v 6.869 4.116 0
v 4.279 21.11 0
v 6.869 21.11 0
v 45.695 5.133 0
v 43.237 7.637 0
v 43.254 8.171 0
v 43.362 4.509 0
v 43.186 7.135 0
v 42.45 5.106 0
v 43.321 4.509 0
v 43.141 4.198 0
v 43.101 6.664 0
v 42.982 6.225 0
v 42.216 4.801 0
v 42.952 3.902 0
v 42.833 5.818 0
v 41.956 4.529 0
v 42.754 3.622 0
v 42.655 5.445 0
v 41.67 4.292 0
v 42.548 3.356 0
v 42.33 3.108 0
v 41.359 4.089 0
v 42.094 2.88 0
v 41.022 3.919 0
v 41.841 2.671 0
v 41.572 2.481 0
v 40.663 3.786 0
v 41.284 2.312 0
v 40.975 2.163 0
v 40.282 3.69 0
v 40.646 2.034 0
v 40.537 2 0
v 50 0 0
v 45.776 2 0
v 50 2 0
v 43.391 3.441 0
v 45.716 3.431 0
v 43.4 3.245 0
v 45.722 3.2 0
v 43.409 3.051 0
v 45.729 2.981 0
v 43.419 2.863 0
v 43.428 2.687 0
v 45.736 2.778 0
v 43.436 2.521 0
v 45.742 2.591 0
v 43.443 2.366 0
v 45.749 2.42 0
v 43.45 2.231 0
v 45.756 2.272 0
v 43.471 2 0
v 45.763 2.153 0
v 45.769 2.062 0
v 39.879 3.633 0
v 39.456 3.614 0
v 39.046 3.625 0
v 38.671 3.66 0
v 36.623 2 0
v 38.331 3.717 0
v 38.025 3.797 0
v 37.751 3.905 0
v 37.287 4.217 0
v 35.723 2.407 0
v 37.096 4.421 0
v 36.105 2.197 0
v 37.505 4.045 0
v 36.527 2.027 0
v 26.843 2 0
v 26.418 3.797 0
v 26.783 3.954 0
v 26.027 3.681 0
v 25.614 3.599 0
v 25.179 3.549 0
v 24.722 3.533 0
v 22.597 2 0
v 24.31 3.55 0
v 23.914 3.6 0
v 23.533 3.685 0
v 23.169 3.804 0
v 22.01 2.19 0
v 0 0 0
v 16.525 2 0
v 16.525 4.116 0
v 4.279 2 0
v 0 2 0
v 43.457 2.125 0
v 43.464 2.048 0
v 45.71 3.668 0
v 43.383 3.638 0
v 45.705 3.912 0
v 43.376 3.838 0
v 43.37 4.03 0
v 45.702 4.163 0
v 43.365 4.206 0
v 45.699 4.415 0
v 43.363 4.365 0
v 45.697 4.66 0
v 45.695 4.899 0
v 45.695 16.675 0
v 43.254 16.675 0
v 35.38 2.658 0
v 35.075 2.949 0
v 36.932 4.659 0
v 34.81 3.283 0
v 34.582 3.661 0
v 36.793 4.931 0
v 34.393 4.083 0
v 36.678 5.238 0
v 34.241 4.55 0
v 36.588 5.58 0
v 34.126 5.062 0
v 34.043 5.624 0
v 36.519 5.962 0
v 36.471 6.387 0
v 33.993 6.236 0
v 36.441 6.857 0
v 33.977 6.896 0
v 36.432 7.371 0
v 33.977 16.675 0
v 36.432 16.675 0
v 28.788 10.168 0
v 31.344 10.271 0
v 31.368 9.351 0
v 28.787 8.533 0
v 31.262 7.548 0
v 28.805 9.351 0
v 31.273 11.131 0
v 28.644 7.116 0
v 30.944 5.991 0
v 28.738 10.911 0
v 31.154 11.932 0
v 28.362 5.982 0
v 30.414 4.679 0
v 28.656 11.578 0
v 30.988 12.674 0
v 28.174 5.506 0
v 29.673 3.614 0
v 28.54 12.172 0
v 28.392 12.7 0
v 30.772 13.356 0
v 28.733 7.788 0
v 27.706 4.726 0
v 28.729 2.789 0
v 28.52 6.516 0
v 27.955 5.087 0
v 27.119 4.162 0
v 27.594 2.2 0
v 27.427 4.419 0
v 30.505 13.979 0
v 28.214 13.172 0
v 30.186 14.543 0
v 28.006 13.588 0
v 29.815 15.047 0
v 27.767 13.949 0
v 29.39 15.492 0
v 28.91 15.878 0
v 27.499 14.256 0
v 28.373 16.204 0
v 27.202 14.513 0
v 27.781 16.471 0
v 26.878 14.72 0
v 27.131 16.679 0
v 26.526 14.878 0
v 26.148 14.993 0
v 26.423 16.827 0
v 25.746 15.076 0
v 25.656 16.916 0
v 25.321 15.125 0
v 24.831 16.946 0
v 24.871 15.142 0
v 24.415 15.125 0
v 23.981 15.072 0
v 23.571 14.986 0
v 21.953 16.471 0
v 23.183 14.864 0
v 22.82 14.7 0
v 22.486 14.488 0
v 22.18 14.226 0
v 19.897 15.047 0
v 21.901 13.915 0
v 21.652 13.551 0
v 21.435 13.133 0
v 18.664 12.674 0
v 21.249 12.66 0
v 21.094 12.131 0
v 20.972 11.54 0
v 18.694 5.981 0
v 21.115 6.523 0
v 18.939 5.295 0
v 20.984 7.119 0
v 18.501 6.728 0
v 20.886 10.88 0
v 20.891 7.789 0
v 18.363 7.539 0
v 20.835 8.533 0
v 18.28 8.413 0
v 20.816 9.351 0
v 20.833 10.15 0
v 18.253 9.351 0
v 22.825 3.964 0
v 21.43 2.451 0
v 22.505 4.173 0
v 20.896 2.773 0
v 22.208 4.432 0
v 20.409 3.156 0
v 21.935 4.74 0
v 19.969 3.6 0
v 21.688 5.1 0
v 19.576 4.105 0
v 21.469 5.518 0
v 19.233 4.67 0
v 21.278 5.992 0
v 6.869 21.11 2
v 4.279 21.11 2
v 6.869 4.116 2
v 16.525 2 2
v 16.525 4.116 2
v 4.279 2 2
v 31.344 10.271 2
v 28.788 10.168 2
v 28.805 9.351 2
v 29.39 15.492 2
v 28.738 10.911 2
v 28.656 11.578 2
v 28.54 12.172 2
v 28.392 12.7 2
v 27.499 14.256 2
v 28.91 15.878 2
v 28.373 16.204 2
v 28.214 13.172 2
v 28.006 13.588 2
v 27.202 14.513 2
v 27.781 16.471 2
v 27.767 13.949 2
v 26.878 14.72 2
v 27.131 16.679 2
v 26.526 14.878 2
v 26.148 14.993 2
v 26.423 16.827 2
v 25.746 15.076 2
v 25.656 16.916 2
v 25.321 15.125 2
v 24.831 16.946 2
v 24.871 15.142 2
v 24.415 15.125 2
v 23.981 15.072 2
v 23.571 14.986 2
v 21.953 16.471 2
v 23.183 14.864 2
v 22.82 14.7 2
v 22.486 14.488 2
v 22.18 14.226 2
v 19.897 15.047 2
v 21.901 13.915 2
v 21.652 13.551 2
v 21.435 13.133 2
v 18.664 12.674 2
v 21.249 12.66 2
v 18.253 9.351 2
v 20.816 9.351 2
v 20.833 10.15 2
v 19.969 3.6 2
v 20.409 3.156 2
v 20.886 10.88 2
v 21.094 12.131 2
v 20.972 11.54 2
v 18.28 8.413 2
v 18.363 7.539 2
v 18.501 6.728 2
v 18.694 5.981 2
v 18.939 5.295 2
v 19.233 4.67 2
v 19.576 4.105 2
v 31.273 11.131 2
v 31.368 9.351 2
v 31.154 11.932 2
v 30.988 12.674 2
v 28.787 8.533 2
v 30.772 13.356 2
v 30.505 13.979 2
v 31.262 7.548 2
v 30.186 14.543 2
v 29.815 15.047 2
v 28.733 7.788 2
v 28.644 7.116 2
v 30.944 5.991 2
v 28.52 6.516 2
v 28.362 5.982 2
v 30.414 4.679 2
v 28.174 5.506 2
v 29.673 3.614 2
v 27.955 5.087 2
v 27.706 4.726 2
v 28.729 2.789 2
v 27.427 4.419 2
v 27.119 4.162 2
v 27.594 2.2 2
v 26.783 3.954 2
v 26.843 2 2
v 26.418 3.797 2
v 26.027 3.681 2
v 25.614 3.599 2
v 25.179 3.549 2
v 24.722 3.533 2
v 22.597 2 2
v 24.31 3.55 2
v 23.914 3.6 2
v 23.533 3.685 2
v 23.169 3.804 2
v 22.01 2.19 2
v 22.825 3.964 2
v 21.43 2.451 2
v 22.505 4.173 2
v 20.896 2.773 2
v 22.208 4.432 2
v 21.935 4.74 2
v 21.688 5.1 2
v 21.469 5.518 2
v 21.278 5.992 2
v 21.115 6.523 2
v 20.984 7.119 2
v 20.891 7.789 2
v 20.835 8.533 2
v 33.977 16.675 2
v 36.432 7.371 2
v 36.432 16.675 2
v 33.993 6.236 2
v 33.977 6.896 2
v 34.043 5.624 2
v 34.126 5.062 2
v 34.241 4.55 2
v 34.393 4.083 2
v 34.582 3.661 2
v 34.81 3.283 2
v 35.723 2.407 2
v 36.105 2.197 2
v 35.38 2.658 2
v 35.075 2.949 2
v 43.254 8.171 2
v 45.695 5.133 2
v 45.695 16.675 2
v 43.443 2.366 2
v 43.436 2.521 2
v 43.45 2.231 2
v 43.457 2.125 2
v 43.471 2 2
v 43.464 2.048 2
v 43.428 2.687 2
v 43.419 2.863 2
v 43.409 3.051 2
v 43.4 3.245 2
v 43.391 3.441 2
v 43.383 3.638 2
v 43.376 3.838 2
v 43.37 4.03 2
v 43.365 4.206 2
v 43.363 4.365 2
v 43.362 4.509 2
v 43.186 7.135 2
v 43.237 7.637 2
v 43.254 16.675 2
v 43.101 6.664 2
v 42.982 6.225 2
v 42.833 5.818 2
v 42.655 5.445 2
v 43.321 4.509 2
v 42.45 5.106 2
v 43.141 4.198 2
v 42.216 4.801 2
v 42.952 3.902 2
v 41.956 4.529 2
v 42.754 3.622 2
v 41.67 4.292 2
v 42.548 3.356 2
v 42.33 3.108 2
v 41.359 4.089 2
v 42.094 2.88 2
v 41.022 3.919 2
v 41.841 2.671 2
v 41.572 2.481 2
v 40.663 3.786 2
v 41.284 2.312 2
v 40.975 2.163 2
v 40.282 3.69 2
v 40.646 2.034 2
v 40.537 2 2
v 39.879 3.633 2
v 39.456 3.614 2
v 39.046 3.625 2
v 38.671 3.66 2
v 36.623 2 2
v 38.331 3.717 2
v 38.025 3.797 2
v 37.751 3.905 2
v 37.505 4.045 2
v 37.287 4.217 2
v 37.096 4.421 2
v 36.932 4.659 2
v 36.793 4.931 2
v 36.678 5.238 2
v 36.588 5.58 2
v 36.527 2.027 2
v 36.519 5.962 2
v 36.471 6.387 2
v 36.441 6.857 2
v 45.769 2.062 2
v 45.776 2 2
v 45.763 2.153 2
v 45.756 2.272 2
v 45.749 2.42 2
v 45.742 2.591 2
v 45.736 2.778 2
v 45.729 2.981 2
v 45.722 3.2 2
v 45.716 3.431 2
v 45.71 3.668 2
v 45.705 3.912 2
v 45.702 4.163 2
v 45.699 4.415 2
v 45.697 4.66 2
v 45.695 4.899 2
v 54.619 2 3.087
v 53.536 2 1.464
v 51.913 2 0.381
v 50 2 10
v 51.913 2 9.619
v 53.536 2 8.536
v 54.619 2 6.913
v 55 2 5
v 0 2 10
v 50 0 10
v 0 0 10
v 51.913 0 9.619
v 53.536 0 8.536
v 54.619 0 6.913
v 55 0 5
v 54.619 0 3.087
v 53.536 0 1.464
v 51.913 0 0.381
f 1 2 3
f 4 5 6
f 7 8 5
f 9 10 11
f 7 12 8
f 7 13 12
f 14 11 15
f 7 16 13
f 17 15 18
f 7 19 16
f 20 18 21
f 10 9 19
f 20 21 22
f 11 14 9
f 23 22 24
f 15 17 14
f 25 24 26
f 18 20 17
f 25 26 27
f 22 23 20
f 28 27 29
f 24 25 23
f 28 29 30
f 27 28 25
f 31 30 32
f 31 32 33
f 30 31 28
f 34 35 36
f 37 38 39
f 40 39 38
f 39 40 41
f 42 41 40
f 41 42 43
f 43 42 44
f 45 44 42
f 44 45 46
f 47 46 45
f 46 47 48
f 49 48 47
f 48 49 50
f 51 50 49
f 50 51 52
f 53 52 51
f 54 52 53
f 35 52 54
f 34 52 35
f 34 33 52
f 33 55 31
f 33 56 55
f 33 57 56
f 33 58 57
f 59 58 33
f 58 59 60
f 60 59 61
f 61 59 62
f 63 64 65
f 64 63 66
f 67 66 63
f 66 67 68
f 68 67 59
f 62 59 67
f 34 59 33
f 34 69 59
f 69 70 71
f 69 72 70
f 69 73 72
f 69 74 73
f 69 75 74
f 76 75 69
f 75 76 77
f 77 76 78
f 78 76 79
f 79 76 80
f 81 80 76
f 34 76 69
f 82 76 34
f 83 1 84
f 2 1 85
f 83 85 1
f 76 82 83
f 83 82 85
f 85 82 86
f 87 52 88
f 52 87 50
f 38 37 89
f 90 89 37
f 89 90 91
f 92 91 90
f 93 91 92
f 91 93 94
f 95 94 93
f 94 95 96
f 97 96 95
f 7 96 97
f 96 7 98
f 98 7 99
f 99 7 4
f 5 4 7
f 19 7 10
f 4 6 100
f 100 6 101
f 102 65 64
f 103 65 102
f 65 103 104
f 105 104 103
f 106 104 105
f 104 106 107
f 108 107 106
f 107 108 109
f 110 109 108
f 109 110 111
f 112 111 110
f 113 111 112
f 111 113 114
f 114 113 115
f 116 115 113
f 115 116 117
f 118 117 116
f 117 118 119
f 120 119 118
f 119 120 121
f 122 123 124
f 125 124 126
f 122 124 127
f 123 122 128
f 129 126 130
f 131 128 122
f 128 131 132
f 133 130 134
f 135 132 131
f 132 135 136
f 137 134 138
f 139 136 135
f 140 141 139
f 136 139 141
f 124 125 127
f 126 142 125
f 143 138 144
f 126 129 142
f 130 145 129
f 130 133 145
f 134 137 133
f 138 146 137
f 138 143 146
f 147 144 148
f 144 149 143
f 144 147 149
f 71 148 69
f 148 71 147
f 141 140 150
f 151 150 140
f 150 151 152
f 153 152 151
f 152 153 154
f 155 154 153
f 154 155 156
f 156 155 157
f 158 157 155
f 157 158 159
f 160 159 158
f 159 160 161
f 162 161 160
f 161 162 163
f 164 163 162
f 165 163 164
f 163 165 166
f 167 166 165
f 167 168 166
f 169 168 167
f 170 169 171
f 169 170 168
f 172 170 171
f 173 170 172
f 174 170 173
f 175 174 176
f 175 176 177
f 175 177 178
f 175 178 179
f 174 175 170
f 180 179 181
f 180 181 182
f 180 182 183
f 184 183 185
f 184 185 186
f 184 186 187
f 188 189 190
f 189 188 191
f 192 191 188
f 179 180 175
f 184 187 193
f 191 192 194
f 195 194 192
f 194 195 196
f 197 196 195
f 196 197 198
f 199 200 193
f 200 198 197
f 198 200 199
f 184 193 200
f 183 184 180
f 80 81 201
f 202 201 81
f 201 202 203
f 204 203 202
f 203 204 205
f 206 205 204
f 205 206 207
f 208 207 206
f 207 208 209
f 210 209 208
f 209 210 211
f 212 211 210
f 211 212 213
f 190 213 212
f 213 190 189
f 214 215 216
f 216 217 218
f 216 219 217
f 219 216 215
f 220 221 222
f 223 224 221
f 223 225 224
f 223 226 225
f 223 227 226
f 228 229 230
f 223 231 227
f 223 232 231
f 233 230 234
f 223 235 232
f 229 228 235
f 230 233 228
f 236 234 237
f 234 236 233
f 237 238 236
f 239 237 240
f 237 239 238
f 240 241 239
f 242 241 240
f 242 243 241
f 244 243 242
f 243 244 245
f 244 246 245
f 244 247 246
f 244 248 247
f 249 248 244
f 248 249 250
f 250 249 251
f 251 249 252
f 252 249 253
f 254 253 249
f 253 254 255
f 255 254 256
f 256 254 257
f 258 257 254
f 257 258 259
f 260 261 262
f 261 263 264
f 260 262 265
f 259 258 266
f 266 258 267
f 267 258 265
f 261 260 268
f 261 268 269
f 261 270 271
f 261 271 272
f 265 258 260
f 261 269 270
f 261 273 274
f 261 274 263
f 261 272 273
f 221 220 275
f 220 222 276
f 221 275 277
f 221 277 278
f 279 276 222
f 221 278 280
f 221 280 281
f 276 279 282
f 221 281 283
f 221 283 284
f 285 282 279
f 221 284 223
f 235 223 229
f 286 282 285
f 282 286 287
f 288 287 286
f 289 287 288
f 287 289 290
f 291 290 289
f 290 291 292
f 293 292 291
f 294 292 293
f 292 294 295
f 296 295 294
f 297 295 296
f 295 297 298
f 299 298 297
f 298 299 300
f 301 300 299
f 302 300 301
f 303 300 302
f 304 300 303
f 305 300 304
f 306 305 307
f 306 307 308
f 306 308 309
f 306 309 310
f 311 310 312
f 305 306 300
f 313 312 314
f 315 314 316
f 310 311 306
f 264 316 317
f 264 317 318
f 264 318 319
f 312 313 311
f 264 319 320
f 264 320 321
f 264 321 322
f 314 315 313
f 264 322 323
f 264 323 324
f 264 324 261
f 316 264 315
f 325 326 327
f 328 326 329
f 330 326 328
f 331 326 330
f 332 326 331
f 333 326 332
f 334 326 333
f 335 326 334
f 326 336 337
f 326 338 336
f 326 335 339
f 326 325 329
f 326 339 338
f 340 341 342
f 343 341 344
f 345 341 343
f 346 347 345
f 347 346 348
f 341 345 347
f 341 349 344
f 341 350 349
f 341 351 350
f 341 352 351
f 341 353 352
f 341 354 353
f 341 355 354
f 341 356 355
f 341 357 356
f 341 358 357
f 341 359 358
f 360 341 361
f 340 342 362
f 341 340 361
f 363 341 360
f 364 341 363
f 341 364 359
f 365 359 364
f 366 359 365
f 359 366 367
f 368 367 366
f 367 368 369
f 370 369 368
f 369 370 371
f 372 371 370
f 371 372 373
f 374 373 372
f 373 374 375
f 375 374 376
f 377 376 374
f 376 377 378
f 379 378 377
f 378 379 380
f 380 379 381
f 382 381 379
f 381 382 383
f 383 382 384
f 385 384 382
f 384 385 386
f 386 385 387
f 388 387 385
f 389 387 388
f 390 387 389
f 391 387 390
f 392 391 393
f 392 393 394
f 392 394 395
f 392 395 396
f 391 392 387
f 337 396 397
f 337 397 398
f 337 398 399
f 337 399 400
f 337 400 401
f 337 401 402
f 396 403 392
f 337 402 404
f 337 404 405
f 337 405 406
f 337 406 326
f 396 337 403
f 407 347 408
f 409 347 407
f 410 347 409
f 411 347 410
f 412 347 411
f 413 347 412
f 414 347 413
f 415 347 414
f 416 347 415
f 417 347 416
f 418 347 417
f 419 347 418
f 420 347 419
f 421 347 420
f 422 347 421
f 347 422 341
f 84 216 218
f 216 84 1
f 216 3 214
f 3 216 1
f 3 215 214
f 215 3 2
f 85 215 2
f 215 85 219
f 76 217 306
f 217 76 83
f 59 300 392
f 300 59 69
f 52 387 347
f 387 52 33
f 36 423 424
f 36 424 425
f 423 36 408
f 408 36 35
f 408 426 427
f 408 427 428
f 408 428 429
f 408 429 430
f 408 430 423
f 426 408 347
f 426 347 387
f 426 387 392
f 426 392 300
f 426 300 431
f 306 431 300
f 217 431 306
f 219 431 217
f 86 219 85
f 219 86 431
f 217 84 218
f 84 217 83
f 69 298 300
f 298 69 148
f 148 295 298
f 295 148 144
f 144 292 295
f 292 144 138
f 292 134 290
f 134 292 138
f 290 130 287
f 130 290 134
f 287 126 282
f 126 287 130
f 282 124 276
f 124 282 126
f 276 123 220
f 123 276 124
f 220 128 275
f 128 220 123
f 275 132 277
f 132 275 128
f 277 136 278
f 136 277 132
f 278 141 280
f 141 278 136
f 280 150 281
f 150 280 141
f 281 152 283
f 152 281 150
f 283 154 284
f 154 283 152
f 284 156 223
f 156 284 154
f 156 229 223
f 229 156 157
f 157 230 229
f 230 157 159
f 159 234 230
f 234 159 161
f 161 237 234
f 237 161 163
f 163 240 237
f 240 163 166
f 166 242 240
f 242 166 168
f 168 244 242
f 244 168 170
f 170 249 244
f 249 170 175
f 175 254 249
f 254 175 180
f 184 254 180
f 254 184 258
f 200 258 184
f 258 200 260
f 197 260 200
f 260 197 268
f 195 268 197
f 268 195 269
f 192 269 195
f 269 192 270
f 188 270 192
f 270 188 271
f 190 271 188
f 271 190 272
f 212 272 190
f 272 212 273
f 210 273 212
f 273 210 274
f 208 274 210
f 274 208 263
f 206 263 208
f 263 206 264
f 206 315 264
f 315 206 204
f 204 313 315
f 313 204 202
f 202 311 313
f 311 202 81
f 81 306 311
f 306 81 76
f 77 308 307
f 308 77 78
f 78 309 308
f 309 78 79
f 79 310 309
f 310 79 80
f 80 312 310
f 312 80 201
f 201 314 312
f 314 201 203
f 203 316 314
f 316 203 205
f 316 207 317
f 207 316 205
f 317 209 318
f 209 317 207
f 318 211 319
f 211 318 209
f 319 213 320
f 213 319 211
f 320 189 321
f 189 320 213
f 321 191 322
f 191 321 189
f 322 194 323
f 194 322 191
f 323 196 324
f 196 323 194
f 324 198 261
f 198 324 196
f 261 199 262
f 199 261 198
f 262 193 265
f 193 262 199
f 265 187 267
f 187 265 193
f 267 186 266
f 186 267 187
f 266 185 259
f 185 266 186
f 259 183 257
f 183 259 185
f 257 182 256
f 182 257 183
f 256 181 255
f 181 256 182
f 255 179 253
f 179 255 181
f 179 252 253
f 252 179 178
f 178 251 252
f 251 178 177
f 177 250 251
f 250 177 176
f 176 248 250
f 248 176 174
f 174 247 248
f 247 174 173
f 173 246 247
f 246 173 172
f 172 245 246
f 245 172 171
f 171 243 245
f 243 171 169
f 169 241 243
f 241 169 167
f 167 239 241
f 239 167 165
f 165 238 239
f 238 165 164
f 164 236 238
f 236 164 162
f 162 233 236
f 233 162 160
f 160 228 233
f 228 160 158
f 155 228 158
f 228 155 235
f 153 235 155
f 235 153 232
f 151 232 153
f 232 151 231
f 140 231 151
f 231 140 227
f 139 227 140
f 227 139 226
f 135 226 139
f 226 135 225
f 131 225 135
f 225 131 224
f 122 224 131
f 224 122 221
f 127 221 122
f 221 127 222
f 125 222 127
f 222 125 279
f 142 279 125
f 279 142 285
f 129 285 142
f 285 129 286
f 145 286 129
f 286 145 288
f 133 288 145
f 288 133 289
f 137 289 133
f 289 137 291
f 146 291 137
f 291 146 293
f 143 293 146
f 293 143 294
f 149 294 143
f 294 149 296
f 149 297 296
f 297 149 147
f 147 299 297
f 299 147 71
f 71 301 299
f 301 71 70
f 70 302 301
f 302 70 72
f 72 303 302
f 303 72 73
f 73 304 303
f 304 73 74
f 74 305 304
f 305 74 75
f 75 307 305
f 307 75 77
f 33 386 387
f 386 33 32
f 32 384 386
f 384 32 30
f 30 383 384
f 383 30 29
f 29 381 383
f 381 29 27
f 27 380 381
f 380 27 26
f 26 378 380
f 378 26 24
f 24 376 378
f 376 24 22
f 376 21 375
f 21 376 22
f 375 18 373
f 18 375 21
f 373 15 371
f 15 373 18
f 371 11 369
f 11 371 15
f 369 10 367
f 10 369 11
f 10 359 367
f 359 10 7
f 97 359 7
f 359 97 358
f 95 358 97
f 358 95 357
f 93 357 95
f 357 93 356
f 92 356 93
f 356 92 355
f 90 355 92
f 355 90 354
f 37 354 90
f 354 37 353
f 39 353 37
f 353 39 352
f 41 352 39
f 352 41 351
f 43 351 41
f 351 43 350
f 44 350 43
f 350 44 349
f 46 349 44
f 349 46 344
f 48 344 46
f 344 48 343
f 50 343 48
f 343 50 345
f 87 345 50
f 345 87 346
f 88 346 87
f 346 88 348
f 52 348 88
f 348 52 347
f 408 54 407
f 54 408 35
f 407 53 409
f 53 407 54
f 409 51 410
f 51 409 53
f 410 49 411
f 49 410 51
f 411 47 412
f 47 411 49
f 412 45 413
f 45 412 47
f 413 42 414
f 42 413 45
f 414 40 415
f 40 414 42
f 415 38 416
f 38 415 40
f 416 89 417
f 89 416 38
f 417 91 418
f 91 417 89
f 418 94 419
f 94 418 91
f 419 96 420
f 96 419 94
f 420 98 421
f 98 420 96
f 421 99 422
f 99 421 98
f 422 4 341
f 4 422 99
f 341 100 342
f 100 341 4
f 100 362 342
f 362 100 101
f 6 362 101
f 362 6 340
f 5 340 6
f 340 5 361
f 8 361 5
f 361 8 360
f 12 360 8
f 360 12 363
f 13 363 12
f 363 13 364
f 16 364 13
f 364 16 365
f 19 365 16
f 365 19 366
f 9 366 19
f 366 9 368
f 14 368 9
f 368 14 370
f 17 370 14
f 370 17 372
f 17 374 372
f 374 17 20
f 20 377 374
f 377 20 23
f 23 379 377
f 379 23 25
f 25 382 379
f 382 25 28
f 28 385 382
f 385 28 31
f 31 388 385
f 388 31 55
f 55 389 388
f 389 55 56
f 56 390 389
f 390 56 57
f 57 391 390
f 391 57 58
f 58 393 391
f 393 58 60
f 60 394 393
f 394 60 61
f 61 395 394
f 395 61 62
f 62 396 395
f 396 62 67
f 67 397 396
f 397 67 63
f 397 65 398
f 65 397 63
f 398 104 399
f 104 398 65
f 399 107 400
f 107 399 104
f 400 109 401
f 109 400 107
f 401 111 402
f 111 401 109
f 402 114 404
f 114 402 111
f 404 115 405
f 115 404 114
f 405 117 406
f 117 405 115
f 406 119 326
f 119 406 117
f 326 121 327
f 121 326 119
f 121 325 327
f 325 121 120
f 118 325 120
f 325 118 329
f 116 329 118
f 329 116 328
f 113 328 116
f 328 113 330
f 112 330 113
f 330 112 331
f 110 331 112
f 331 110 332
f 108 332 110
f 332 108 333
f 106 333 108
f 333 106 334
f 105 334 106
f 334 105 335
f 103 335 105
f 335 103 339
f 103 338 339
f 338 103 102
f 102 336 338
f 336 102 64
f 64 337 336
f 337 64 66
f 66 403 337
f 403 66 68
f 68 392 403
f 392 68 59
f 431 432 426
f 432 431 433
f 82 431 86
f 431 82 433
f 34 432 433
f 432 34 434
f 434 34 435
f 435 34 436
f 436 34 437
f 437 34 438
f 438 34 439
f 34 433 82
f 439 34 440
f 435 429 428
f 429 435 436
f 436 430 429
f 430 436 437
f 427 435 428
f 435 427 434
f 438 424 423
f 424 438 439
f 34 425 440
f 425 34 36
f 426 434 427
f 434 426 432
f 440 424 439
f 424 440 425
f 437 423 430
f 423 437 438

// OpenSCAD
translate([2, 2, 0])
linear_extrude(height=2)
    text("Lou", 20, "Arial");

cube([50, 2, 10]);


translate([50, 2, 5])
rotate([90, 0, 0])
cylinder(h=2, r=5);
